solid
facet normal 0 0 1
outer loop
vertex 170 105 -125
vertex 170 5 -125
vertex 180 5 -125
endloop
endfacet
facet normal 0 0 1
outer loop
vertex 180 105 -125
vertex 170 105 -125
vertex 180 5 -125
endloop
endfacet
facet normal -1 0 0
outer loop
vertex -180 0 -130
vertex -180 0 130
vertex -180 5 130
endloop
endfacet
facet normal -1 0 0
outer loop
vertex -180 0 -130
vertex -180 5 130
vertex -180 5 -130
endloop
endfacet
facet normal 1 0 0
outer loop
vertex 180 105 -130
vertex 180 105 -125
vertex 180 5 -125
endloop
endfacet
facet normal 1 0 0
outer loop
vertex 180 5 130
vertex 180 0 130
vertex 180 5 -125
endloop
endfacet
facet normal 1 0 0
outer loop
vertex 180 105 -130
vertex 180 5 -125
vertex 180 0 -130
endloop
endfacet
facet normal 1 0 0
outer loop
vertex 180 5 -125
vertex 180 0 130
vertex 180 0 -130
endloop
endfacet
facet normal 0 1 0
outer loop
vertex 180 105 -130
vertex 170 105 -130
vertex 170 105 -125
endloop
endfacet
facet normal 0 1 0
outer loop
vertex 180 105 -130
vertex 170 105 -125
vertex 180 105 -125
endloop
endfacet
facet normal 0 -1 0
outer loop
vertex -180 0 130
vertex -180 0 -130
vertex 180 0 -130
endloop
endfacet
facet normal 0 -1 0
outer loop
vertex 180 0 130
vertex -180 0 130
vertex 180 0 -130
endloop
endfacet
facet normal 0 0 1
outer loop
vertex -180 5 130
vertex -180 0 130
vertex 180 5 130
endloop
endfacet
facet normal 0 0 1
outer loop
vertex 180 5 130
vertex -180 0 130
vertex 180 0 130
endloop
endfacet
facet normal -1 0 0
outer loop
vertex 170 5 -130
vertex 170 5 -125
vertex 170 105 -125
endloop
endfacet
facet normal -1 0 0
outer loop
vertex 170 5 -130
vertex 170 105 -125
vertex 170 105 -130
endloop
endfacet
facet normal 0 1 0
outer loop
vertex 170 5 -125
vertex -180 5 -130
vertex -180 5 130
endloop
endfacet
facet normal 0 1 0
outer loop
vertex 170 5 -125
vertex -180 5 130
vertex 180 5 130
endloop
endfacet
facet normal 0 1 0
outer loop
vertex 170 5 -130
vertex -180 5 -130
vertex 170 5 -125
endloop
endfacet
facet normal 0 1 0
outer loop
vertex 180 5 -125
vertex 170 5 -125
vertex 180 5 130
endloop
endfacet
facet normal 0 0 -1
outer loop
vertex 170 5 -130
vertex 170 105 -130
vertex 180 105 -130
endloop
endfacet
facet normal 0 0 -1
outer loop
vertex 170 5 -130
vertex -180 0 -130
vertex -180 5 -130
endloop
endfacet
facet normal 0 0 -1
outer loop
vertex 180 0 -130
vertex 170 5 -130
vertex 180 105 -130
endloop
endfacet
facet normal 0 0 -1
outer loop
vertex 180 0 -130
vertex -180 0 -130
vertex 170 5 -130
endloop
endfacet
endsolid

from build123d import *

# Parameters (mm, degrees)
ESQUISSE1_W        = 360
ESQUISSE1_H        = 260
BOSS_EXTRU_1_DEPTH = 5
ESQUISSE3_W        = 10
ESQUISSE3_H        = 5
BOSS_EXTRU_3_DEPTH = 100


with BuildPart() as part:
    # Esquisse1 → Boss.-Extru.1 (new body)
    with BuildSketch(Plane(origin=(0, 0, 0), x_dir=(1, 0, 0), z_dir=(0, 1, 0))):
        Rectangle(ESQUISSE1_W, ESQUISSE1_H)
    extrude(amount=BOSS_EXTRU_1_DEPTH)

    # Esquisse3 → Boss.-Extru.3 (add)
    with BuildSketch(Plane(origin=(0, 5, 0), x_dir=(1, 0, 0), z_dir=(0, 1, 0))):
        with Locations((175, 127.5)):
            Rectangle(ESQUISSE3_W, ESQUISSE3_H)
    extrude(amount=BOSS_EXTRU_3_DEPTH)


solid = part.part
